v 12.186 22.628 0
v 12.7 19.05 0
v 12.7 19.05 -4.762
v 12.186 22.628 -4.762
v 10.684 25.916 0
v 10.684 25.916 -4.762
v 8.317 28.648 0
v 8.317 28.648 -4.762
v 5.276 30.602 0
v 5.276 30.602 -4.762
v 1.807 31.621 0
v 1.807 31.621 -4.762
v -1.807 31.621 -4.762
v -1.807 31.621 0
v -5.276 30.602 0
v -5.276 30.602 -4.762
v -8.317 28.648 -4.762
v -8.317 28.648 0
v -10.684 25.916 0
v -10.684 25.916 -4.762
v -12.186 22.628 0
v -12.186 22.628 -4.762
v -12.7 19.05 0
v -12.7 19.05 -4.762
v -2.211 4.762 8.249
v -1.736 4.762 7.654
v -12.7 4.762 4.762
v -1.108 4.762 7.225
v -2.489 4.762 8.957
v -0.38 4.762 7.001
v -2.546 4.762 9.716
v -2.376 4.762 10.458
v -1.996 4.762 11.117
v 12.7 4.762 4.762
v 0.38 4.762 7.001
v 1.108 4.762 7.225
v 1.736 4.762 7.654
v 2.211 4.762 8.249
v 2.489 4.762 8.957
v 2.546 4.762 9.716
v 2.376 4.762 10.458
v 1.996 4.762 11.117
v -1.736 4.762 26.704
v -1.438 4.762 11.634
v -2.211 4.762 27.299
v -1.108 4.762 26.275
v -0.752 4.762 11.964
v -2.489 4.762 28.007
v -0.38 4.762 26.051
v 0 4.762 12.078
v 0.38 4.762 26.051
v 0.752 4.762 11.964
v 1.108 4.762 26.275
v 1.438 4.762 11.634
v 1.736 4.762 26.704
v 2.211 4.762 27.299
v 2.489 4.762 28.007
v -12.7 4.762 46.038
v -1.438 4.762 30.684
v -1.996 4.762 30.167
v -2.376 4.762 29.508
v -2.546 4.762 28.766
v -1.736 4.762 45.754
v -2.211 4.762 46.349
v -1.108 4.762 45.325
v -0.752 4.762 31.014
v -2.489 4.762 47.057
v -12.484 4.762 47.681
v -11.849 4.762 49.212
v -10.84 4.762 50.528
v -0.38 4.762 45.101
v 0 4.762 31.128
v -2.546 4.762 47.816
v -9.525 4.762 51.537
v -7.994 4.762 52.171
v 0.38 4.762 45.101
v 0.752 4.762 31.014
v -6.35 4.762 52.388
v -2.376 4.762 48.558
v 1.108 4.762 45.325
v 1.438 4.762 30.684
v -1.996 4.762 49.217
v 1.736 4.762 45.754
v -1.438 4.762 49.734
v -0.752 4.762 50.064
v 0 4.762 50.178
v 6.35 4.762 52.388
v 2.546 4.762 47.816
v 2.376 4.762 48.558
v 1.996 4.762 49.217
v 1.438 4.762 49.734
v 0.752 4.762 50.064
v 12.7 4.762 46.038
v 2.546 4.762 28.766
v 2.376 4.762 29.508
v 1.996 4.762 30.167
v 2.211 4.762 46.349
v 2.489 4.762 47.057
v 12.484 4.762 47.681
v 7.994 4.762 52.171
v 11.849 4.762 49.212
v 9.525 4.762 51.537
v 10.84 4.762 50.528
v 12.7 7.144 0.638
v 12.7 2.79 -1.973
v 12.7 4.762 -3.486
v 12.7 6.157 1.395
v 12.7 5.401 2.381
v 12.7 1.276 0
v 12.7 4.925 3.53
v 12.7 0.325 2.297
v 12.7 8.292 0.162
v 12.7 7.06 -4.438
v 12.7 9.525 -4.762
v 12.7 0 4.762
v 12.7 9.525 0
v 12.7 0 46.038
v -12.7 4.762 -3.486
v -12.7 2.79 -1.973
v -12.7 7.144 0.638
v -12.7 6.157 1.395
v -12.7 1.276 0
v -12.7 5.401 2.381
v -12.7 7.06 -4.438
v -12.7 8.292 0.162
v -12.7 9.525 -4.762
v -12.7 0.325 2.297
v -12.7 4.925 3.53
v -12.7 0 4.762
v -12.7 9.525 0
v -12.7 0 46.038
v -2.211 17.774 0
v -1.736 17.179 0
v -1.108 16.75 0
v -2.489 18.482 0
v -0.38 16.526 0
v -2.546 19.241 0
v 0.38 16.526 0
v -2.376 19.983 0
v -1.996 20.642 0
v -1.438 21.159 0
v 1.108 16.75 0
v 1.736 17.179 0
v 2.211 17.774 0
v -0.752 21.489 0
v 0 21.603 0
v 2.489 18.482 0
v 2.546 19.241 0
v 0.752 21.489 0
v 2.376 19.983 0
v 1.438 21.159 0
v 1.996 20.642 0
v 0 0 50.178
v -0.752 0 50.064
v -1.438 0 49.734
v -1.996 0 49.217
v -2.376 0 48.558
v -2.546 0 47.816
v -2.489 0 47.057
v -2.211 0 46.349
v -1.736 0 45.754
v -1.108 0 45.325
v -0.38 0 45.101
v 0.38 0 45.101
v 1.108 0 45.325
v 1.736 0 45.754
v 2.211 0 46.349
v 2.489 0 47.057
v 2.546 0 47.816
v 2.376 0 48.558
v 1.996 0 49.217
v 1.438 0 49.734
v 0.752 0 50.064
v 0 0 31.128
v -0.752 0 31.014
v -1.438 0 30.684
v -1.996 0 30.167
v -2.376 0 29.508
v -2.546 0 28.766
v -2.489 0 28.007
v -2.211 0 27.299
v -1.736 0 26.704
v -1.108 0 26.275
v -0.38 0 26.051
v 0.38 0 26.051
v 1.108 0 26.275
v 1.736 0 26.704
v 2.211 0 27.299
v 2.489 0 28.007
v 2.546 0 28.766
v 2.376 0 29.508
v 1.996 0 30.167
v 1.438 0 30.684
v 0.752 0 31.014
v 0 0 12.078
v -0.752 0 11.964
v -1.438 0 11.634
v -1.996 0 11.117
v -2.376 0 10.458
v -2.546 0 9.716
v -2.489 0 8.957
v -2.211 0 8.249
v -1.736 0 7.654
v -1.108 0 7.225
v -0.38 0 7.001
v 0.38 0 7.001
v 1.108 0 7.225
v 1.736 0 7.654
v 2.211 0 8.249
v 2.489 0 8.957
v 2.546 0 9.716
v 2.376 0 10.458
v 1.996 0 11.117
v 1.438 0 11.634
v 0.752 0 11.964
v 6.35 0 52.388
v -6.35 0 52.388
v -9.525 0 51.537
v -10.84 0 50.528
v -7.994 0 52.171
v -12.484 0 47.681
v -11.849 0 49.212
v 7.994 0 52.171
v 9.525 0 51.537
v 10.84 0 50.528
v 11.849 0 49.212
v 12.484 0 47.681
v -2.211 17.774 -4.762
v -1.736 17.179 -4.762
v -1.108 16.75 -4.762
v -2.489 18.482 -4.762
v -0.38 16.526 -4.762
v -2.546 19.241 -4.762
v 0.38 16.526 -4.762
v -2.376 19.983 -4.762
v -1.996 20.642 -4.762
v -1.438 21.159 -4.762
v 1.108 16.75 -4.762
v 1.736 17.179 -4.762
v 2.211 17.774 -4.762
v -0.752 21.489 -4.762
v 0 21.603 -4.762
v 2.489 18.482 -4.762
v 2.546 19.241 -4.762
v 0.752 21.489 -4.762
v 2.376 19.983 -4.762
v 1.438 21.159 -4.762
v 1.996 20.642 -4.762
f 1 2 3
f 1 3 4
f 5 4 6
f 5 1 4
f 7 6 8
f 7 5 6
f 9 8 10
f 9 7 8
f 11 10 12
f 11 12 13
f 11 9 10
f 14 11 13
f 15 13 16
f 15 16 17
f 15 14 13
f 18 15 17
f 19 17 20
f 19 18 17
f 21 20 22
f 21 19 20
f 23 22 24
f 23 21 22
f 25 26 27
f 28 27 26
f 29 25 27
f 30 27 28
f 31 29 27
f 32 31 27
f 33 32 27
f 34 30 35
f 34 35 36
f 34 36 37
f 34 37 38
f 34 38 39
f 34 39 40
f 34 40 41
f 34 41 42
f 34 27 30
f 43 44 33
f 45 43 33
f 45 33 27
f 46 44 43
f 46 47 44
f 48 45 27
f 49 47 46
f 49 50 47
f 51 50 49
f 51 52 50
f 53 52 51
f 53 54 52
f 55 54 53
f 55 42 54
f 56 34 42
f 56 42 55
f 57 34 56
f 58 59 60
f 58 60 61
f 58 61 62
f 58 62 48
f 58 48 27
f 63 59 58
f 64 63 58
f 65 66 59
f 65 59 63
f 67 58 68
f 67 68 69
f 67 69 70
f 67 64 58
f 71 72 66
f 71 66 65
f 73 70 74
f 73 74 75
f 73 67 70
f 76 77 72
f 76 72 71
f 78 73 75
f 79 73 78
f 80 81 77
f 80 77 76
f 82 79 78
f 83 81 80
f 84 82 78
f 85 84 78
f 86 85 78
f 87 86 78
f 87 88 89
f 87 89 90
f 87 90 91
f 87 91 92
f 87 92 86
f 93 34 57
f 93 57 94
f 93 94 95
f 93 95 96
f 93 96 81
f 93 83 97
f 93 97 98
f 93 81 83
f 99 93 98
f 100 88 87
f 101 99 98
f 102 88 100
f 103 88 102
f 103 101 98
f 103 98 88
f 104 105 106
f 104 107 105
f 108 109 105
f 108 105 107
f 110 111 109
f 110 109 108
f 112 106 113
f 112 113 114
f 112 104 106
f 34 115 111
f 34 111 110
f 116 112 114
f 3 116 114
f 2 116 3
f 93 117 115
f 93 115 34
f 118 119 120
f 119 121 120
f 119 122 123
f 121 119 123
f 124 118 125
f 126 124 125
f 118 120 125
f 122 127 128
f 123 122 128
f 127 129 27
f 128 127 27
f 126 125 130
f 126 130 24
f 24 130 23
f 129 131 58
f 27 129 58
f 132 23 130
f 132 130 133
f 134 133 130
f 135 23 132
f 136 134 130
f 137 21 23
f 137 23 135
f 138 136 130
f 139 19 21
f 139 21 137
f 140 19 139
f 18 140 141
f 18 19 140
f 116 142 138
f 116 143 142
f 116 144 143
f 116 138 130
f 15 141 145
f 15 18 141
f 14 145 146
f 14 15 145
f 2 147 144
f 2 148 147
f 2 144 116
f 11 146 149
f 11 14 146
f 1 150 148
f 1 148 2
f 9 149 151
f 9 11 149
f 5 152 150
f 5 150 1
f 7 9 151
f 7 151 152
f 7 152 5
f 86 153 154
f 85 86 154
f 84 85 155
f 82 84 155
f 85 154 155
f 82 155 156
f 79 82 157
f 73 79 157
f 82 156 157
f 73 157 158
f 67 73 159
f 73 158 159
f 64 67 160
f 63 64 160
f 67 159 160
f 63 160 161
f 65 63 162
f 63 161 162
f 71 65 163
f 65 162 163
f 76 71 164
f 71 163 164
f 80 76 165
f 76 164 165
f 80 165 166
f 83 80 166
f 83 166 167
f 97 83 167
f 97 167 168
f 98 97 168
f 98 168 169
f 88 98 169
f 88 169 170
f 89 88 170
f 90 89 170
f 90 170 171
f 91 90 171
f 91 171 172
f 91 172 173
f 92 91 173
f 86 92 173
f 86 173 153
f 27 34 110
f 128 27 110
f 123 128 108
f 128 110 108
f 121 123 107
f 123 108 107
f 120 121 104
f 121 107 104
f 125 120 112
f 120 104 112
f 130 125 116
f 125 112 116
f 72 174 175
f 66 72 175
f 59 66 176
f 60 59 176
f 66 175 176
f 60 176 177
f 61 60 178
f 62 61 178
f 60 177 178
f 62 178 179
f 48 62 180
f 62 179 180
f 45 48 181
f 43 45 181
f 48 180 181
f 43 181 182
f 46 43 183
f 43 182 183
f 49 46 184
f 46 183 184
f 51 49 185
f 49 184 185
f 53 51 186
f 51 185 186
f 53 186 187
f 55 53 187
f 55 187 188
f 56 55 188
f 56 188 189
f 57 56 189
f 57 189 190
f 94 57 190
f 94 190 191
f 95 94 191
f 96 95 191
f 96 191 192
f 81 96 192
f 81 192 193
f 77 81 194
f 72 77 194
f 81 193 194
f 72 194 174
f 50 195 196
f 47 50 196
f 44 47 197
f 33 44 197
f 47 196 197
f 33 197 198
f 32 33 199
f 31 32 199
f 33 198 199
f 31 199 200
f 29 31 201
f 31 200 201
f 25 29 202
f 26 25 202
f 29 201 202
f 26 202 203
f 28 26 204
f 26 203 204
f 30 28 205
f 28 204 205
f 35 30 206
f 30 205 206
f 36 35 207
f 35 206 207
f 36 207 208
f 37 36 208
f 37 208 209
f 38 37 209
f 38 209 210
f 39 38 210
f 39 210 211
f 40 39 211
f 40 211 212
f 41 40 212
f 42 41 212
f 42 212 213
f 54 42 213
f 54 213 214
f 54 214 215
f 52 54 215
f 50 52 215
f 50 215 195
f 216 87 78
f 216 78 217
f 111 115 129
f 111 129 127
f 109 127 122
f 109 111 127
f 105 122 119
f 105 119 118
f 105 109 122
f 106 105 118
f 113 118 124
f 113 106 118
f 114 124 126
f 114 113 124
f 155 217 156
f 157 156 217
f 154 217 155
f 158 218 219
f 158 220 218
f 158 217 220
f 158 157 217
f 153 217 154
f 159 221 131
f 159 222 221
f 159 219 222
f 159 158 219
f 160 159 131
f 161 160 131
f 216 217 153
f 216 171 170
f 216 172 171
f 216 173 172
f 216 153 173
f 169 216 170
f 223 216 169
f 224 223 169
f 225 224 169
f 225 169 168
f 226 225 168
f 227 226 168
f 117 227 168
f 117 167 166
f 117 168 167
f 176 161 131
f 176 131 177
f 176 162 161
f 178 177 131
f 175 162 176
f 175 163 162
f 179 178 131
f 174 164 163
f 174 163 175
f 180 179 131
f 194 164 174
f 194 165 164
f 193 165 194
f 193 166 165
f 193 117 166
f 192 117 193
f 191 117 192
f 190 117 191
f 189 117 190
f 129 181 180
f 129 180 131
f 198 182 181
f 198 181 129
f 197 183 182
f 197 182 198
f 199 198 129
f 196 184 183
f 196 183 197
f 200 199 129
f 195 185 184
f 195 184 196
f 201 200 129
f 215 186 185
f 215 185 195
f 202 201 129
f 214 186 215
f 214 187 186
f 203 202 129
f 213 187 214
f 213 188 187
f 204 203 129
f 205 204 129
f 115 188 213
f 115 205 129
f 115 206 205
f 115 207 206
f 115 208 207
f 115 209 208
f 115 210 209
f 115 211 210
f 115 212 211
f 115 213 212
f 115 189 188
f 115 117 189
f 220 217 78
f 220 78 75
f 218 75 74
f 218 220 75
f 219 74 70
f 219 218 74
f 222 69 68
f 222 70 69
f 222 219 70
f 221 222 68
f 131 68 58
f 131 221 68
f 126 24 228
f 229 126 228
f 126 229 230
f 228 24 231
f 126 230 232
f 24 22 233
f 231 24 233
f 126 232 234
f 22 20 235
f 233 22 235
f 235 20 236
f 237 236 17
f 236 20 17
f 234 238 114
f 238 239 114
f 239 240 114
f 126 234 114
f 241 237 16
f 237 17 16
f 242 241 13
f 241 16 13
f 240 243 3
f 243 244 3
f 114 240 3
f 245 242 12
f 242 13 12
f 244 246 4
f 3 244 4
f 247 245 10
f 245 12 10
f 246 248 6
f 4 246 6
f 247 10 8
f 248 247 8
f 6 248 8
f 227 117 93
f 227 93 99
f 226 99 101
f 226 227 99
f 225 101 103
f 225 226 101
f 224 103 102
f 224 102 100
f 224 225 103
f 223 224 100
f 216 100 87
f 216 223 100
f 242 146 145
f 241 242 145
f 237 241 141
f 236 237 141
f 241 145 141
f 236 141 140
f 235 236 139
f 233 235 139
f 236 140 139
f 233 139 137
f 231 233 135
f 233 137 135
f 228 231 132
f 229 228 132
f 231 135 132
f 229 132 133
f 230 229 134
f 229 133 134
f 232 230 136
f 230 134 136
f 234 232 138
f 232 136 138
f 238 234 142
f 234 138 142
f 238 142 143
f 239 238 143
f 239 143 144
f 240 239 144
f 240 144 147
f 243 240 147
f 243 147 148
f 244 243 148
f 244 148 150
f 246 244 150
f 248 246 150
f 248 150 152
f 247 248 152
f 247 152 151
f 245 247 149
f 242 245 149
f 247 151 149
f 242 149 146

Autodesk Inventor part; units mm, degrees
ref_plane "YZ Plane" through (0, 0, 0) normal (1, 0, 0) x (0, 1, 0)
ref_plane "XZ Plane" through (0, 0, 0) normal (0, 1, 0) x (-1, 0, 0)
ref_plane "XY Plane" through (0, 0, 0) normal (0, 0, 1) x (1, 0, 0)
sketch "Sketch1" plane through (0, 0, 0) normal (0, 0, 1) x (1, 0, 0)
  line L0 (-17.78, 0) -> (17.78, 0) construction
  line L1 (-12.7, 0) -> (12.7, 0)
  line L2 (12.7, 0) -> (12.7, 19.05)
  arc A0 (12.7, 19.05) -> (-12.7, 19.05) centre (0, 19.05) ccw
  line L3 (-12.7, 19.05) -> (-12.7, 0)
  point P0 (0, 0)
  dimension "d0" = 25.4
  dimension "d1" = 19.05
extrude "Plate1" add sketch "Sketch1" against normal blind 4.7625
sketch "Sketch2" plane through (12.7, 4.7625, -4.7625) normal (0, -1, 0) x (1, 0, 0)
  line L0 (-25.4, 0) -> (0, 0)
  line L1 (0, 0) -> (0, 57.15)
  line L2 (0, 57.15) -> (-25.4, 57.15)
  line L3 (-25.4, 57.15) -> (-25.4, 0)
edge flange "Flange1" height 57.15 angle 90 thickness 4.7625 bend radius 4.7625 thickness toward (0, -1, 0) relief tear relief width 4.7625 relief depth 2.3813 edges at (0, 0, 0) wall of the first edge with corners at (-12.7, 4.7625, -4.7625) (12.7, 4.7625, -4.7625) (12.7, 4.7625, 52.3875) (-12.7, 4.7625, 52.3875)
bend "Bend1"
corner "Corner1"
sketch "Sketch3" plane through (0, 0, -4.7625) normal (0, 0, -1) x (-1, 0, 0)
  arc A0 (12.7, 19.05) -> (-12.7, 19.05) centre (0, 19.05) ccw construction
  point P0 (0, 0)
hole "Hole1" at (0, 19.05, -4.7625) direction (0, 0, 1) diameter 5.1054 end through all clearance for "Flat Head Machine Screw (82)" size "#10" standard "Ansi Unified Screw Threads"
sketch "Sketch4" plane through (-12.7, 4.7625, 52.3875) normal (0, 1, 0) x (1, 0, 0)
  line L0 (25.4, 47.625) -> (0, 47.625) construction
  line L1 (0, 47.625) -> (0, 0) construction
  line L2 (0, 0) -> (25.4, 0) construction
  line L3 (25.4, 47.625) -> (25.4, 0) construction
  line L4 (0, 0) -> (25.4, 47.625) construction
  line L5 (12.7, 4.7625) -> (12.7, 42.8625) construction
  point P0 (12.7, 52.3875)
  point P1 (12.7, 23.8125)
  dimension "d22" = 38.1
hole "Hole2" at (0, 4.7625, 47.625) at (0, 4.7625, 28.575) at (0, 4.7625, 9.525) direction (0, -1, 0) diameter 5.1054 end through all clearance for "Flat Head Machine Screw (82)" size "#10" standard "Ansi Unified Screw Threads"
fillet "Corner Round1" radius 6.35 2 edges at (-12.7, 2.3812, 52.3875) (12.7, 2.3812, 52.3875)
equation "\"d20\" = Thickness"
equation "\"d4\" = Thickness"
equation "\"d5\" = BendReliefWidth"
equation "\"d6\" = BendReliefDepth"
equation "\"d7\" = MinimumRemnant"
equation "\"d8\" = TransitionRadius"
equation "\"d11\" = BendRadius"
equation "\"d12\" = CornerReliefSize"
equation "\"d13\" = GapSize"
equation "\"d14\" = JacobiRadiusSize"
equation "\"BendRadius\" = Thickness"
equation "\"BendReliefWidth\" = Thickness"
equation "\"BendReliefDepth\" = 0.5 * Thickness"
equation "\"CornerReliefSize\" = 4 * Thickness"
equation "\"MinimumRemnant\" = 2 * Thickness"
equation "\"TransitionRadius\" = BendRadius"
equation "\"JacobiRadiusSize\" = BendRadius"
equation "\"GapSize\" = Thickness"
equation "\"Thickness\" = 4.7625"
properties part number "MOUNT,KICKER"
